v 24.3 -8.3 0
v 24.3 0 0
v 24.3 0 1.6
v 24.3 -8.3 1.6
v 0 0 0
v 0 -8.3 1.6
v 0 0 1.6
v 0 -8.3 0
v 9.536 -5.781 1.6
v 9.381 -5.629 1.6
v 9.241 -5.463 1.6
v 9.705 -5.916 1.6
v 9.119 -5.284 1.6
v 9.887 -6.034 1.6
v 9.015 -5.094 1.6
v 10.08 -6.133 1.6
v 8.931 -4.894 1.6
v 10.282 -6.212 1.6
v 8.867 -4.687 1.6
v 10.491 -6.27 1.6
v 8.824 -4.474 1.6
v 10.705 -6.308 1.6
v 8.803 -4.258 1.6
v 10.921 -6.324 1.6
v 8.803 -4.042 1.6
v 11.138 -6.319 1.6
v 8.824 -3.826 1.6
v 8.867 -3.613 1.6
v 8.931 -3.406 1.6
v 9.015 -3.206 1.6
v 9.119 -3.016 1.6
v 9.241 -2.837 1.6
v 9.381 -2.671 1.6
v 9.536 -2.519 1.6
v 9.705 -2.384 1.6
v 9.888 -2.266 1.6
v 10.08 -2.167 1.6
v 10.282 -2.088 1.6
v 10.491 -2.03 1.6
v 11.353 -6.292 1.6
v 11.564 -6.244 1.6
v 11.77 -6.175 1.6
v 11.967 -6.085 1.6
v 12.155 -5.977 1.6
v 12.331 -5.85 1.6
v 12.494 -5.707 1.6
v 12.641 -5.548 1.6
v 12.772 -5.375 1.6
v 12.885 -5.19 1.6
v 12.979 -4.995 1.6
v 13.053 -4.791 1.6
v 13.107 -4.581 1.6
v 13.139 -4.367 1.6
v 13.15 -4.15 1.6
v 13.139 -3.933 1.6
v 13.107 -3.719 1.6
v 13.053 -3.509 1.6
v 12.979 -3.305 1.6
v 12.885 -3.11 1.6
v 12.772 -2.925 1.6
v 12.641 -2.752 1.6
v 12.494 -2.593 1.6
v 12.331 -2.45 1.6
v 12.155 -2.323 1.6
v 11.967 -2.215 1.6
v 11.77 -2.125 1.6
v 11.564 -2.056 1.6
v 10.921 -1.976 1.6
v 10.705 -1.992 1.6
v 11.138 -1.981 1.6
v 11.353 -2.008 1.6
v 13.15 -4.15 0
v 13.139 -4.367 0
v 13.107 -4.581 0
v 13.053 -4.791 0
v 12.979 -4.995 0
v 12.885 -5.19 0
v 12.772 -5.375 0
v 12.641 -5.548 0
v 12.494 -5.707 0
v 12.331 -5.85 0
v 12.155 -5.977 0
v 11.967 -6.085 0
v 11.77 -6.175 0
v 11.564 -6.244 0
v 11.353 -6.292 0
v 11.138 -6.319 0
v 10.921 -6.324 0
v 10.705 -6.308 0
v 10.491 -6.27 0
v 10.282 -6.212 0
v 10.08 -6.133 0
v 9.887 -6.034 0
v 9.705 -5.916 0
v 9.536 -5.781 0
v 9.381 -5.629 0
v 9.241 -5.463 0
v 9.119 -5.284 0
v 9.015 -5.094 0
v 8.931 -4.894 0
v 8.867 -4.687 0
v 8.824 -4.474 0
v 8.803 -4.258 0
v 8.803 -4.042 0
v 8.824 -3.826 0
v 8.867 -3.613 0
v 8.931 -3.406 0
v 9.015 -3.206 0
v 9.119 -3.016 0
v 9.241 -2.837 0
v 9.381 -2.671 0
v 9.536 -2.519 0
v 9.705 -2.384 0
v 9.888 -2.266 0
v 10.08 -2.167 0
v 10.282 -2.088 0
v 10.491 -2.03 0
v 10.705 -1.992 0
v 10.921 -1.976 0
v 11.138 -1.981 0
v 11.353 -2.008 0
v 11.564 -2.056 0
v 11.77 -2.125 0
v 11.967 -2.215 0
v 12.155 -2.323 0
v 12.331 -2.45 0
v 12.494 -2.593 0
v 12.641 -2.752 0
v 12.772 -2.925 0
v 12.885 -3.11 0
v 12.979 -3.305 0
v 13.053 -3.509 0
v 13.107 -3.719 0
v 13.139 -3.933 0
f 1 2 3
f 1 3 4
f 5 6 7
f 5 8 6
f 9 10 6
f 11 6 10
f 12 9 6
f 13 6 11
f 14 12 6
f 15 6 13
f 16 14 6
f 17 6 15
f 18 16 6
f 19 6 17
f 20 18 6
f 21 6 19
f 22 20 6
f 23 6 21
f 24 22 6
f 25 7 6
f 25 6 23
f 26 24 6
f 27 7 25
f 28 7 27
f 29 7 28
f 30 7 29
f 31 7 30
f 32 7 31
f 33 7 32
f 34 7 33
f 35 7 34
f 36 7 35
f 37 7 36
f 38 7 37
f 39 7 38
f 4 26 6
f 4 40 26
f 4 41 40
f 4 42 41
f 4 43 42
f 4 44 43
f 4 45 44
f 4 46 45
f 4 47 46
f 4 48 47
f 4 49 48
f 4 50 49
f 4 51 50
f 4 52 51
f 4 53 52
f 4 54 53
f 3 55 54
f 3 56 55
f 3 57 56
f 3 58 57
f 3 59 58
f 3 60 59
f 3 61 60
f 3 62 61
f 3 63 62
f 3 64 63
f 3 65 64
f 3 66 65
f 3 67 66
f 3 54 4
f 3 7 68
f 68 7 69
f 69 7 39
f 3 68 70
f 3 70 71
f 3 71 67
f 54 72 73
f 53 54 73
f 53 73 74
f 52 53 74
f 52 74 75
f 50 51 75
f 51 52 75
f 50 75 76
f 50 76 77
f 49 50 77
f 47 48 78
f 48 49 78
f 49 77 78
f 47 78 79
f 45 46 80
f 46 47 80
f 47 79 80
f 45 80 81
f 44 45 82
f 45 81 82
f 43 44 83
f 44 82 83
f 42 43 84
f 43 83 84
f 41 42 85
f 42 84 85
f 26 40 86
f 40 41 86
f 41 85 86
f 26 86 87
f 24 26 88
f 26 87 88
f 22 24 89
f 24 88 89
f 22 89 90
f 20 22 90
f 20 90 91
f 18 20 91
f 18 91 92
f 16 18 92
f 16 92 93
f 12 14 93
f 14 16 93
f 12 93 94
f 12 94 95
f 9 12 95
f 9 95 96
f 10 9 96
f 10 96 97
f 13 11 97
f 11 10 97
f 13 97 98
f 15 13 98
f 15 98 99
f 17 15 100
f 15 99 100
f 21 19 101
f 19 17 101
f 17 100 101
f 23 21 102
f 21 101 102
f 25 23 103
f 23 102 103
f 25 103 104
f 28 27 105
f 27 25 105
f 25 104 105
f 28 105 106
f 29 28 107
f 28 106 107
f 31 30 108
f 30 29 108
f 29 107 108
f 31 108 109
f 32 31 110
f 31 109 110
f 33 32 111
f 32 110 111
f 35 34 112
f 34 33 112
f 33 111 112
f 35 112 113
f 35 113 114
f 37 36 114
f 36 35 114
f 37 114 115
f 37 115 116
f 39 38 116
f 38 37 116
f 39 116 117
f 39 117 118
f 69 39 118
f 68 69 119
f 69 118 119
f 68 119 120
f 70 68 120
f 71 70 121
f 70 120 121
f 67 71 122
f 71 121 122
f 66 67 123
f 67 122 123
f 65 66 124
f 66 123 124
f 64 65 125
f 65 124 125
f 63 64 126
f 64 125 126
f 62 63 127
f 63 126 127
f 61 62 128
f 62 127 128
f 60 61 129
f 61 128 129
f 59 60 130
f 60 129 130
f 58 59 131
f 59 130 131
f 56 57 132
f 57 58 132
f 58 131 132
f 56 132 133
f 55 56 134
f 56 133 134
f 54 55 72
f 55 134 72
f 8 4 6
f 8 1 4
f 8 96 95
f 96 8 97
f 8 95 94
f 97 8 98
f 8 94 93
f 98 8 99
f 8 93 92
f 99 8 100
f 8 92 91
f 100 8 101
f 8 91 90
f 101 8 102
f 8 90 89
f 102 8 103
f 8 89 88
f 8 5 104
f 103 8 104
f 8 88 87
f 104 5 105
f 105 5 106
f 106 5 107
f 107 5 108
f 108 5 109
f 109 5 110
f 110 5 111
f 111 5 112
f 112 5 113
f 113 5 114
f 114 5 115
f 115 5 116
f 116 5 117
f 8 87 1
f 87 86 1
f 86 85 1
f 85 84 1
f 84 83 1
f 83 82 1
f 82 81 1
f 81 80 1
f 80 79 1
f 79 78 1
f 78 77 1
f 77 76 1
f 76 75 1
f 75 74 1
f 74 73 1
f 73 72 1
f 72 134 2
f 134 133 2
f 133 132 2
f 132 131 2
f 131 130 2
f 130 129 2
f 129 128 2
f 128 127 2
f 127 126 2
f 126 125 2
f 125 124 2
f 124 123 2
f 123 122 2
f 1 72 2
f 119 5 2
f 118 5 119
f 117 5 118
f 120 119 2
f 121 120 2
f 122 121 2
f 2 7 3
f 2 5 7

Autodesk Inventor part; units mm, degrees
ref_plane "YZ Plane" through (0, 0, 0) normal (1, 0, 0) x (0, 1, 0)
ref_plane "XZ Plane" through (0, 0, 0) normal (0, 1, 0) x (-1, 0, 0)
ref_plane "XY Plane" through (0, 0, 0) normal (0, 0, 1) x (1, 0, 0)
sketch "Skizze1" plane through (0, 0, 0) normal (0, 0, 1) x (1, 0, 0)
  line L0 (0, 0) -> (24.3, 0)
  line L1 (24.3, 0) -> (24.3, -8.3)
  line L2 (24.3, -8.3) -> (0, -8.3)
  line L3 (0, -8.3) -> (0, 0)
  circle A0 centre (10.975, -4.15) radius 2.175
  dimension "d0" = 8.3
  dimension "d1" = 24.3
  dimension "d2" = 4.15
  dimension "d3" = 4.15
  dimension "d4" = 4.35
  dimension "d5" = 13.325
extrude "Extrusion1" add sketch "Skizze1" along normal blind 1.6
equation "\"d2\" = d3"
properties part number "Grundplatte" material "PBT-Kunststoff"
